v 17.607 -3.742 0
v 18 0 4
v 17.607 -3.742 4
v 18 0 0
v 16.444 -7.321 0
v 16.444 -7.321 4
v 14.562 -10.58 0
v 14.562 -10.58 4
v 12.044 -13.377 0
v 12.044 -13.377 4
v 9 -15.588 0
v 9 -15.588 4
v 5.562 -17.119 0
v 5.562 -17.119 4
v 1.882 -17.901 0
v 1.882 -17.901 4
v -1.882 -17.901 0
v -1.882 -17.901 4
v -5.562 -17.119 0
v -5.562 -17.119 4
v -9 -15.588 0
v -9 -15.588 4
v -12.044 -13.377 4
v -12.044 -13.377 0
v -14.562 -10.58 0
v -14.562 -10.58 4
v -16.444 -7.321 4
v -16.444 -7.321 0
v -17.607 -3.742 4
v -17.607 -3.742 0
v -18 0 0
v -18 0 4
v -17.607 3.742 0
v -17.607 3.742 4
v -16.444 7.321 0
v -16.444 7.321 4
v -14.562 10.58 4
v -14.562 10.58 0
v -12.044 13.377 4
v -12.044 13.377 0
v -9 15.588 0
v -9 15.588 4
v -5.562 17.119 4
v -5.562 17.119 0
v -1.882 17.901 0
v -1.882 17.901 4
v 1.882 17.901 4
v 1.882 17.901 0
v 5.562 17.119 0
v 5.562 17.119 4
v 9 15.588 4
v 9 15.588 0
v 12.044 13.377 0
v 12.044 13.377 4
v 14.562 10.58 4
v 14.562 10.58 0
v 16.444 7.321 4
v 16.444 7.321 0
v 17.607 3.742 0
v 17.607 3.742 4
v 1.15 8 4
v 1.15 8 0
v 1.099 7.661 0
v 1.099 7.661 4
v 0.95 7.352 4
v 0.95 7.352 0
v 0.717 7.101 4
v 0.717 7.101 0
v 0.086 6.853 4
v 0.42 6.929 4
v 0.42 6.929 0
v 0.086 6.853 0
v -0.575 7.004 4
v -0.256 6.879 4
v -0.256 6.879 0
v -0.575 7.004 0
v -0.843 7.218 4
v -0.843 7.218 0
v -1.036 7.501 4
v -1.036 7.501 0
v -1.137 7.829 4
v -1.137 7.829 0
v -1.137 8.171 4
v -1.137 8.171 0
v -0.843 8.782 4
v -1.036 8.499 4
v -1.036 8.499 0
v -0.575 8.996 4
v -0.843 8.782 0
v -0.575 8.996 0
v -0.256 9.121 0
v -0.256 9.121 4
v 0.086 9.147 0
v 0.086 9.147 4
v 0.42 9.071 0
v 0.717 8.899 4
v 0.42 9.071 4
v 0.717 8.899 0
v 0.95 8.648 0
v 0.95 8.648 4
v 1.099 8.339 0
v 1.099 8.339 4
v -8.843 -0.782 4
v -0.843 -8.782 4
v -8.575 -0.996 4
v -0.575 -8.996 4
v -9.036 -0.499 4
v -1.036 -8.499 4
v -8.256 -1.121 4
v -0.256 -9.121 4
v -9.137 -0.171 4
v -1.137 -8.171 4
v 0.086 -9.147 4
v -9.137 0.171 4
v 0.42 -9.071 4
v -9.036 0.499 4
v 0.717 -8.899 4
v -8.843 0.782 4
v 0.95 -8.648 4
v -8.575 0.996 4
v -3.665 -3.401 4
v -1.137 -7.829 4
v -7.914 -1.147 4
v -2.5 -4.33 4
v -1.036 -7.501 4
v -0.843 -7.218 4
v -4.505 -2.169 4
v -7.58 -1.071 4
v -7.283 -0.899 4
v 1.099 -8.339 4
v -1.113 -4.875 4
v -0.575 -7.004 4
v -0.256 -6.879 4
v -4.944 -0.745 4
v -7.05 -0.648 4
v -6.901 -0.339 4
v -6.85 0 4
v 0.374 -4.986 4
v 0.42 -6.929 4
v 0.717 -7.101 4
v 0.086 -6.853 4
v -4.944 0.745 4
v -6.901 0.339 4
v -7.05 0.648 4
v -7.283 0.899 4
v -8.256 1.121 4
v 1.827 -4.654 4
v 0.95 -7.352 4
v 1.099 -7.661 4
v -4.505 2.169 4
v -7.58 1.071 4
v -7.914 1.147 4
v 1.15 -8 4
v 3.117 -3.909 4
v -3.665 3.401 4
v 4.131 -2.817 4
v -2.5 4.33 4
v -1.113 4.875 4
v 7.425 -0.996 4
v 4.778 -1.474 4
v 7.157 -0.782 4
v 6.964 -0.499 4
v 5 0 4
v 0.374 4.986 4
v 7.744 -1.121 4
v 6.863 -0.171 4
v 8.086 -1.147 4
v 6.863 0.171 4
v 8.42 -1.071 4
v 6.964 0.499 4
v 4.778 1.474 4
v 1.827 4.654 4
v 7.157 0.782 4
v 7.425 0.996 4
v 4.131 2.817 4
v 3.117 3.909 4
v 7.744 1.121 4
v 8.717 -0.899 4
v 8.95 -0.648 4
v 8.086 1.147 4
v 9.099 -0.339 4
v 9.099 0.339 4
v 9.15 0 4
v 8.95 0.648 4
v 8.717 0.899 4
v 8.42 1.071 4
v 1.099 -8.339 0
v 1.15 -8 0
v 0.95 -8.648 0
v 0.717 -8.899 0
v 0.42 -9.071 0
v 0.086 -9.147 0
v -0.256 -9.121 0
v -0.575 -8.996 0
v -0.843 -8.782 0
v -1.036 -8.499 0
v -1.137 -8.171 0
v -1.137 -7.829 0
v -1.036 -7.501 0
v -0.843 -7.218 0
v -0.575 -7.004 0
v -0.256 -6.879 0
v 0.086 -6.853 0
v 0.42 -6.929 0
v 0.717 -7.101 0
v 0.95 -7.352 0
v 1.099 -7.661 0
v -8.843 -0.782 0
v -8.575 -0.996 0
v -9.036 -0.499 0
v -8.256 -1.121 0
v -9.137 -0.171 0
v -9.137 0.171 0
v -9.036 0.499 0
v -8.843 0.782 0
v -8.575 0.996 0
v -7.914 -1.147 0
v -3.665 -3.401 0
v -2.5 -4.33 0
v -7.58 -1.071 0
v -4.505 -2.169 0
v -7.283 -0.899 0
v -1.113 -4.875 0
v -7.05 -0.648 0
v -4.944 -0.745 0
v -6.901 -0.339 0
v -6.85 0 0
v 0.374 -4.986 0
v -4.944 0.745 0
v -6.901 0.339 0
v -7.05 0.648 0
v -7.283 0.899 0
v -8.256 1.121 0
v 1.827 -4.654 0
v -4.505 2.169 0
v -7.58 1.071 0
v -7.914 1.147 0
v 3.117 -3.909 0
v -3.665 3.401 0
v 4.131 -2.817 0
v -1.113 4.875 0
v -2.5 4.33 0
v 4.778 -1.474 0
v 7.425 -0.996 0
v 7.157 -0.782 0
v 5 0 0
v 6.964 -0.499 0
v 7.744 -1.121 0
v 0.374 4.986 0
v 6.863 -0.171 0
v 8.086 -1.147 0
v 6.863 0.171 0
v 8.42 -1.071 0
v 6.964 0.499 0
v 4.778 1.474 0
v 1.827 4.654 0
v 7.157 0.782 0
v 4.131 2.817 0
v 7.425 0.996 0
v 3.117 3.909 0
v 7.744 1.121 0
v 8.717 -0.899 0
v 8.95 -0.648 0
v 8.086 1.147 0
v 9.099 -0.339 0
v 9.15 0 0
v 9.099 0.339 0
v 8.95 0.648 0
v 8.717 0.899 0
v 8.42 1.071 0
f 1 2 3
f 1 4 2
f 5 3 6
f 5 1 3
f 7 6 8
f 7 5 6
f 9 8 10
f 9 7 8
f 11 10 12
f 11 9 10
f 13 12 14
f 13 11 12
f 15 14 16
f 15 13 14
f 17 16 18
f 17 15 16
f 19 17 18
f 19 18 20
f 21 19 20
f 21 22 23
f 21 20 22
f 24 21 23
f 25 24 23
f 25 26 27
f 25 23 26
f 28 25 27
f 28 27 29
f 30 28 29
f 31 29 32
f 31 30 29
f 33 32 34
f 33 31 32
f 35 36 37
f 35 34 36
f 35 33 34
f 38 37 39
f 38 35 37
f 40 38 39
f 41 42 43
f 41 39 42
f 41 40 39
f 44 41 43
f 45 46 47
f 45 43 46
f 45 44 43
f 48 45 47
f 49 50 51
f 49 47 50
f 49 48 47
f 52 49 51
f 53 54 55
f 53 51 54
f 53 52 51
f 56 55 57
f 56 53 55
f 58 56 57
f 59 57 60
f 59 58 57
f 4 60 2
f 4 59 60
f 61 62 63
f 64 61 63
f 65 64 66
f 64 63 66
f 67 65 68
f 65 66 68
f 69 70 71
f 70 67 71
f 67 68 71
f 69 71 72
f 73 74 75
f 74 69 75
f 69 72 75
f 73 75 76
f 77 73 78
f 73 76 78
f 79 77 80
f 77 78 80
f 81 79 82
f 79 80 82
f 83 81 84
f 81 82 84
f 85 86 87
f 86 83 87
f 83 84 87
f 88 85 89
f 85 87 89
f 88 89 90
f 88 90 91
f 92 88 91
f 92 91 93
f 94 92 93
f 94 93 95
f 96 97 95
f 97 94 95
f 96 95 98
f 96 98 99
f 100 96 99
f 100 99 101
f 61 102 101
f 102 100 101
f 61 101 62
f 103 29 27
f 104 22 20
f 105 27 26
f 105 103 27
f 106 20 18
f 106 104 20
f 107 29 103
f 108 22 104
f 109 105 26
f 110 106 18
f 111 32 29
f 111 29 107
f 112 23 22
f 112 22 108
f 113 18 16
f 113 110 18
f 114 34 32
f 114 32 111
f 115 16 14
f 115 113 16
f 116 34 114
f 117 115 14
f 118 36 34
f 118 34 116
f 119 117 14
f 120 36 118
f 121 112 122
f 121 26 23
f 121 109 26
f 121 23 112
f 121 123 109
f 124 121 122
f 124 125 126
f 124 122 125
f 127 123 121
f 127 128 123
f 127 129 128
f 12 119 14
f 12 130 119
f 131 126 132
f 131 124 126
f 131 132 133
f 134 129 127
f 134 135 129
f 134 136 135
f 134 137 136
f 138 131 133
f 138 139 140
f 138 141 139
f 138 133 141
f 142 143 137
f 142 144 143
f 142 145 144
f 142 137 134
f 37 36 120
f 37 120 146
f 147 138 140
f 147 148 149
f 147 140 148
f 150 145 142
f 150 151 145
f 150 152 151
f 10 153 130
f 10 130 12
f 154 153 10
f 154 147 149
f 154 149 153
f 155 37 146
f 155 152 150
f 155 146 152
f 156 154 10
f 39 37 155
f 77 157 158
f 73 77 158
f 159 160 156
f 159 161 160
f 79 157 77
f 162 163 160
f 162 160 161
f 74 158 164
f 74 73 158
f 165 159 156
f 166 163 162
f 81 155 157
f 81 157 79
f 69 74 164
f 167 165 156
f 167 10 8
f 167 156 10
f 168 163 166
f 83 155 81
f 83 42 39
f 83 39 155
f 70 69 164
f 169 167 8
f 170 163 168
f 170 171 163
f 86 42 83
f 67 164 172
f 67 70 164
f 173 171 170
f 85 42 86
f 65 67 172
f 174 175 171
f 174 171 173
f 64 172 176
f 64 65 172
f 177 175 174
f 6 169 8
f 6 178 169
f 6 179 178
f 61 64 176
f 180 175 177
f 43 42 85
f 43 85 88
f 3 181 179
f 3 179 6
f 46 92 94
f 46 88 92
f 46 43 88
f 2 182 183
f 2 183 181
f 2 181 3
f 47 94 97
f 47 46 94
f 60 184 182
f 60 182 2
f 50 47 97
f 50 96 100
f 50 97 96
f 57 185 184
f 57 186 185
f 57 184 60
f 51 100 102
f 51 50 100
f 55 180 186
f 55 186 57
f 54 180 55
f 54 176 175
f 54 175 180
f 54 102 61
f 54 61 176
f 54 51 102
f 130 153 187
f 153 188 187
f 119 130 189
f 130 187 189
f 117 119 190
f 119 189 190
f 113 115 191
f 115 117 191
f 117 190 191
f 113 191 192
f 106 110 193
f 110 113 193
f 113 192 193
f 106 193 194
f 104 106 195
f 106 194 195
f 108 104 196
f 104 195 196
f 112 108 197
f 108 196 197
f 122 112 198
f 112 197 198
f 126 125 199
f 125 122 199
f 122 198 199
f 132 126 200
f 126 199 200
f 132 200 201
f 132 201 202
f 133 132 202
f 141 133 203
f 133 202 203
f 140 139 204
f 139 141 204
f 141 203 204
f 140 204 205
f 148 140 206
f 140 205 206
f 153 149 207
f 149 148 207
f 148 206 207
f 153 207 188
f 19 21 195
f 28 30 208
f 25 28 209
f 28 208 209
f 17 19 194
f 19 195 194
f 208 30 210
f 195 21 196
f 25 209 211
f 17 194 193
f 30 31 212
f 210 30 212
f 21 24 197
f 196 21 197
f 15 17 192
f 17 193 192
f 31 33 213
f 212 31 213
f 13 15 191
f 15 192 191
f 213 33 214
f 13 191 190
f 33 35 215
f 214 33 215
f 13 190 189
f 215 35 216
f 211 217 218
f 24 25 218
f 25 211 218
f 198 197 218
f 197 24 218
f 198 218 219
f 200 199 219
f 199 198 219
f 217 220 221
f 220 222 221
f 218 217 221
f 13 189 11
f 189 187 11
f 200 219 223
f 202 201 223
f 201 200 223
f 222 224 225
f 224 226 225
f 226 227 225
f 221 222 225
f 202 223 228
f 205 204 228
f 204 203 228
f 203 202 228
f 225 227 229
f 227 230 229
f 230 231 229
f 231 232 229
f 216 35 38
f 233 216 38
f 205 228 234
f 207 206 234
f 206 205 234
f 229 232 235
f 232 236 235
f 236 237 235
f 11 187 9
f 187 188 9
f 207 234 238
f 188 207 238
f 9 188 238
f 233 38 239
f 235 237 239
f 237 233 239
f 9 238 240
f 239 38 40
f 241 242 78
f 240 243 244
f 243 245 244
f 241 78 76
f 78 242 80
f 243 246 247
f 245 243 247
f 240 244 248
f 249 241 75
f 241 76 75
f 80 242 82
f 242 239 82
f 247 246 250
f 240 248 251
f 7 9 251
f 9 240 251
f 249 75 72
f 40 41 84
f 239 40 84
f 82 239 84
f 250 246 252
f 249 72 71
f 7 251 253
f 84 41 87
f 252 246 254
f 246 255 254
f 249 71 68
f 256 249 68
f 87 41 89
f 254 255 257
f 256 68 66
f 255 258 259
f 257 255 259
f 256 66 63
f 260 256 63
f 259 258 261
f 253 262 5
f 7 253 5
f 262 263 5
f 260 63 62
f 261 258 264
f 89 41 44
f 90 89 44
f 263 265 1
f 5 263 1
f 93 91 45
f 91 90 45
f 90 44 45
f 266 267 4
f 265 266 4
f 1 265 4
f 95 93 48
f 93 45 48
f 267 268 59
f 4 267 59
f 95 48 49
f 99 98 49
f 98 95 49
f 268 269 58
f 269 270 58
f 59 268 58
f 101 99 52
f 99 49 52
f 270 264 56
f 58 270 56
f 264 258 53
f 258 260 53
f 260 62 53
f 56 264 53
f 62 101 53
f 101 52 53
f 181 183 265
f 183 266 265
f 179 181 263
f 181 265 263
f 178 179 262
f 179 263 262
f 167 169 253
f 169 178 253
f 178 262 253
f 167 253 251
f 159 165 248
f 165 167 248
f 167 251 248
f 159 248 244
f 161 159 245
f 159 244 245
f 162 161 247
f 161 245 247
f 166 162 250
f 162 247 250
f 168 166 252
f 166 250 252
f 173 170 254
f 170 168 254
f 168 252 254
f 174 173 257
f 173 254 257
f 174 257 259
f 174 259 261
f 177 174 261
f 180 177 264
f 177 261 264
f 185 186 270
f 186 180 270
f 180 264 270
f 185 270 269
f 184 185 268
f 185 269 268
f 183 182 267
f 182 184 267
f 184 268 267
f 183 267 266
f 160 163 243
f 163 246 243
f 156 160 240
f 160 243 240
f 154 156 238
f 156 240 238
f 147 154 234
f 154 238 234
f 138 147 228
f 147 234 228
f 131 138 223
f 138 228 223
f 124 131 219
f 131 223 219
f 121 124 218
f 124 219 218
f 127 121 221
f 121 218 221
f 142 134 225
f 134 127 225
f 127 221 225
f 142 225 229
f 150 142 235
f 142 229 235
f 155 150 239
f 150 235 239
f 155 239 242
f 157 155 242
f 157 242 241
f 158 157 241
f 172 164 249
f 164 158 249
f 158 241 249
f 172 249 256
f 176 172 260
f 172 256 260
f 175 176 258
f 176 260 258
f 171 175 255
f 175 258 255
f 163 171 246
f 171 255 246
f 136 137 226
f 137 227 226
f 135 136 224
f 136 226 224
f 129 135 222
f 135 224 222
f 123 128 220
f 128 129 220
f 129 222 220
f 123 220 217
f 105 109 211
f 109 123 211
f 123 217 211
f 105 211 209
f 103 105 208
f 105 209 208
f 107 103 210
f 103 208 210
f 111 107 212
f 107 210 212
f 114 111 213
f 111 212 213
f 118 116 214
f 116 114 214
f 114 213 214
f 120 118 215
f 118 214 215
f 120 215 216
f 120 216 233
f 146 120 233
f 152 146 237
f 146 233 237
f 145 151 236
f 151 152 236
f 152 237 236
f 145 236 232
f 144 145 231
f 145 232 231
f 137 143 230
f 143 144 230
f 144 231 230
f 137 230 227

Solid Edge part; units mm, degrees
sketch "Sketch1" plane through (0, 0, 0) normal (0, 0, 1) x (1, 0, 0)
  circle A0 centre (0, 0) radius 18
  circle A1 centre (0, 0) radius 5
  circle A2 centre (8, 0) radius 1.15
  circle A3 centre (0, 8) radius 1.15
  circle A4 centre (-8, 0) radius 1.15
  circle A5 centre (0, -8) radius 1.15
extrude "Protrusion1" add sketch "Sketch1" along normal blind 4
